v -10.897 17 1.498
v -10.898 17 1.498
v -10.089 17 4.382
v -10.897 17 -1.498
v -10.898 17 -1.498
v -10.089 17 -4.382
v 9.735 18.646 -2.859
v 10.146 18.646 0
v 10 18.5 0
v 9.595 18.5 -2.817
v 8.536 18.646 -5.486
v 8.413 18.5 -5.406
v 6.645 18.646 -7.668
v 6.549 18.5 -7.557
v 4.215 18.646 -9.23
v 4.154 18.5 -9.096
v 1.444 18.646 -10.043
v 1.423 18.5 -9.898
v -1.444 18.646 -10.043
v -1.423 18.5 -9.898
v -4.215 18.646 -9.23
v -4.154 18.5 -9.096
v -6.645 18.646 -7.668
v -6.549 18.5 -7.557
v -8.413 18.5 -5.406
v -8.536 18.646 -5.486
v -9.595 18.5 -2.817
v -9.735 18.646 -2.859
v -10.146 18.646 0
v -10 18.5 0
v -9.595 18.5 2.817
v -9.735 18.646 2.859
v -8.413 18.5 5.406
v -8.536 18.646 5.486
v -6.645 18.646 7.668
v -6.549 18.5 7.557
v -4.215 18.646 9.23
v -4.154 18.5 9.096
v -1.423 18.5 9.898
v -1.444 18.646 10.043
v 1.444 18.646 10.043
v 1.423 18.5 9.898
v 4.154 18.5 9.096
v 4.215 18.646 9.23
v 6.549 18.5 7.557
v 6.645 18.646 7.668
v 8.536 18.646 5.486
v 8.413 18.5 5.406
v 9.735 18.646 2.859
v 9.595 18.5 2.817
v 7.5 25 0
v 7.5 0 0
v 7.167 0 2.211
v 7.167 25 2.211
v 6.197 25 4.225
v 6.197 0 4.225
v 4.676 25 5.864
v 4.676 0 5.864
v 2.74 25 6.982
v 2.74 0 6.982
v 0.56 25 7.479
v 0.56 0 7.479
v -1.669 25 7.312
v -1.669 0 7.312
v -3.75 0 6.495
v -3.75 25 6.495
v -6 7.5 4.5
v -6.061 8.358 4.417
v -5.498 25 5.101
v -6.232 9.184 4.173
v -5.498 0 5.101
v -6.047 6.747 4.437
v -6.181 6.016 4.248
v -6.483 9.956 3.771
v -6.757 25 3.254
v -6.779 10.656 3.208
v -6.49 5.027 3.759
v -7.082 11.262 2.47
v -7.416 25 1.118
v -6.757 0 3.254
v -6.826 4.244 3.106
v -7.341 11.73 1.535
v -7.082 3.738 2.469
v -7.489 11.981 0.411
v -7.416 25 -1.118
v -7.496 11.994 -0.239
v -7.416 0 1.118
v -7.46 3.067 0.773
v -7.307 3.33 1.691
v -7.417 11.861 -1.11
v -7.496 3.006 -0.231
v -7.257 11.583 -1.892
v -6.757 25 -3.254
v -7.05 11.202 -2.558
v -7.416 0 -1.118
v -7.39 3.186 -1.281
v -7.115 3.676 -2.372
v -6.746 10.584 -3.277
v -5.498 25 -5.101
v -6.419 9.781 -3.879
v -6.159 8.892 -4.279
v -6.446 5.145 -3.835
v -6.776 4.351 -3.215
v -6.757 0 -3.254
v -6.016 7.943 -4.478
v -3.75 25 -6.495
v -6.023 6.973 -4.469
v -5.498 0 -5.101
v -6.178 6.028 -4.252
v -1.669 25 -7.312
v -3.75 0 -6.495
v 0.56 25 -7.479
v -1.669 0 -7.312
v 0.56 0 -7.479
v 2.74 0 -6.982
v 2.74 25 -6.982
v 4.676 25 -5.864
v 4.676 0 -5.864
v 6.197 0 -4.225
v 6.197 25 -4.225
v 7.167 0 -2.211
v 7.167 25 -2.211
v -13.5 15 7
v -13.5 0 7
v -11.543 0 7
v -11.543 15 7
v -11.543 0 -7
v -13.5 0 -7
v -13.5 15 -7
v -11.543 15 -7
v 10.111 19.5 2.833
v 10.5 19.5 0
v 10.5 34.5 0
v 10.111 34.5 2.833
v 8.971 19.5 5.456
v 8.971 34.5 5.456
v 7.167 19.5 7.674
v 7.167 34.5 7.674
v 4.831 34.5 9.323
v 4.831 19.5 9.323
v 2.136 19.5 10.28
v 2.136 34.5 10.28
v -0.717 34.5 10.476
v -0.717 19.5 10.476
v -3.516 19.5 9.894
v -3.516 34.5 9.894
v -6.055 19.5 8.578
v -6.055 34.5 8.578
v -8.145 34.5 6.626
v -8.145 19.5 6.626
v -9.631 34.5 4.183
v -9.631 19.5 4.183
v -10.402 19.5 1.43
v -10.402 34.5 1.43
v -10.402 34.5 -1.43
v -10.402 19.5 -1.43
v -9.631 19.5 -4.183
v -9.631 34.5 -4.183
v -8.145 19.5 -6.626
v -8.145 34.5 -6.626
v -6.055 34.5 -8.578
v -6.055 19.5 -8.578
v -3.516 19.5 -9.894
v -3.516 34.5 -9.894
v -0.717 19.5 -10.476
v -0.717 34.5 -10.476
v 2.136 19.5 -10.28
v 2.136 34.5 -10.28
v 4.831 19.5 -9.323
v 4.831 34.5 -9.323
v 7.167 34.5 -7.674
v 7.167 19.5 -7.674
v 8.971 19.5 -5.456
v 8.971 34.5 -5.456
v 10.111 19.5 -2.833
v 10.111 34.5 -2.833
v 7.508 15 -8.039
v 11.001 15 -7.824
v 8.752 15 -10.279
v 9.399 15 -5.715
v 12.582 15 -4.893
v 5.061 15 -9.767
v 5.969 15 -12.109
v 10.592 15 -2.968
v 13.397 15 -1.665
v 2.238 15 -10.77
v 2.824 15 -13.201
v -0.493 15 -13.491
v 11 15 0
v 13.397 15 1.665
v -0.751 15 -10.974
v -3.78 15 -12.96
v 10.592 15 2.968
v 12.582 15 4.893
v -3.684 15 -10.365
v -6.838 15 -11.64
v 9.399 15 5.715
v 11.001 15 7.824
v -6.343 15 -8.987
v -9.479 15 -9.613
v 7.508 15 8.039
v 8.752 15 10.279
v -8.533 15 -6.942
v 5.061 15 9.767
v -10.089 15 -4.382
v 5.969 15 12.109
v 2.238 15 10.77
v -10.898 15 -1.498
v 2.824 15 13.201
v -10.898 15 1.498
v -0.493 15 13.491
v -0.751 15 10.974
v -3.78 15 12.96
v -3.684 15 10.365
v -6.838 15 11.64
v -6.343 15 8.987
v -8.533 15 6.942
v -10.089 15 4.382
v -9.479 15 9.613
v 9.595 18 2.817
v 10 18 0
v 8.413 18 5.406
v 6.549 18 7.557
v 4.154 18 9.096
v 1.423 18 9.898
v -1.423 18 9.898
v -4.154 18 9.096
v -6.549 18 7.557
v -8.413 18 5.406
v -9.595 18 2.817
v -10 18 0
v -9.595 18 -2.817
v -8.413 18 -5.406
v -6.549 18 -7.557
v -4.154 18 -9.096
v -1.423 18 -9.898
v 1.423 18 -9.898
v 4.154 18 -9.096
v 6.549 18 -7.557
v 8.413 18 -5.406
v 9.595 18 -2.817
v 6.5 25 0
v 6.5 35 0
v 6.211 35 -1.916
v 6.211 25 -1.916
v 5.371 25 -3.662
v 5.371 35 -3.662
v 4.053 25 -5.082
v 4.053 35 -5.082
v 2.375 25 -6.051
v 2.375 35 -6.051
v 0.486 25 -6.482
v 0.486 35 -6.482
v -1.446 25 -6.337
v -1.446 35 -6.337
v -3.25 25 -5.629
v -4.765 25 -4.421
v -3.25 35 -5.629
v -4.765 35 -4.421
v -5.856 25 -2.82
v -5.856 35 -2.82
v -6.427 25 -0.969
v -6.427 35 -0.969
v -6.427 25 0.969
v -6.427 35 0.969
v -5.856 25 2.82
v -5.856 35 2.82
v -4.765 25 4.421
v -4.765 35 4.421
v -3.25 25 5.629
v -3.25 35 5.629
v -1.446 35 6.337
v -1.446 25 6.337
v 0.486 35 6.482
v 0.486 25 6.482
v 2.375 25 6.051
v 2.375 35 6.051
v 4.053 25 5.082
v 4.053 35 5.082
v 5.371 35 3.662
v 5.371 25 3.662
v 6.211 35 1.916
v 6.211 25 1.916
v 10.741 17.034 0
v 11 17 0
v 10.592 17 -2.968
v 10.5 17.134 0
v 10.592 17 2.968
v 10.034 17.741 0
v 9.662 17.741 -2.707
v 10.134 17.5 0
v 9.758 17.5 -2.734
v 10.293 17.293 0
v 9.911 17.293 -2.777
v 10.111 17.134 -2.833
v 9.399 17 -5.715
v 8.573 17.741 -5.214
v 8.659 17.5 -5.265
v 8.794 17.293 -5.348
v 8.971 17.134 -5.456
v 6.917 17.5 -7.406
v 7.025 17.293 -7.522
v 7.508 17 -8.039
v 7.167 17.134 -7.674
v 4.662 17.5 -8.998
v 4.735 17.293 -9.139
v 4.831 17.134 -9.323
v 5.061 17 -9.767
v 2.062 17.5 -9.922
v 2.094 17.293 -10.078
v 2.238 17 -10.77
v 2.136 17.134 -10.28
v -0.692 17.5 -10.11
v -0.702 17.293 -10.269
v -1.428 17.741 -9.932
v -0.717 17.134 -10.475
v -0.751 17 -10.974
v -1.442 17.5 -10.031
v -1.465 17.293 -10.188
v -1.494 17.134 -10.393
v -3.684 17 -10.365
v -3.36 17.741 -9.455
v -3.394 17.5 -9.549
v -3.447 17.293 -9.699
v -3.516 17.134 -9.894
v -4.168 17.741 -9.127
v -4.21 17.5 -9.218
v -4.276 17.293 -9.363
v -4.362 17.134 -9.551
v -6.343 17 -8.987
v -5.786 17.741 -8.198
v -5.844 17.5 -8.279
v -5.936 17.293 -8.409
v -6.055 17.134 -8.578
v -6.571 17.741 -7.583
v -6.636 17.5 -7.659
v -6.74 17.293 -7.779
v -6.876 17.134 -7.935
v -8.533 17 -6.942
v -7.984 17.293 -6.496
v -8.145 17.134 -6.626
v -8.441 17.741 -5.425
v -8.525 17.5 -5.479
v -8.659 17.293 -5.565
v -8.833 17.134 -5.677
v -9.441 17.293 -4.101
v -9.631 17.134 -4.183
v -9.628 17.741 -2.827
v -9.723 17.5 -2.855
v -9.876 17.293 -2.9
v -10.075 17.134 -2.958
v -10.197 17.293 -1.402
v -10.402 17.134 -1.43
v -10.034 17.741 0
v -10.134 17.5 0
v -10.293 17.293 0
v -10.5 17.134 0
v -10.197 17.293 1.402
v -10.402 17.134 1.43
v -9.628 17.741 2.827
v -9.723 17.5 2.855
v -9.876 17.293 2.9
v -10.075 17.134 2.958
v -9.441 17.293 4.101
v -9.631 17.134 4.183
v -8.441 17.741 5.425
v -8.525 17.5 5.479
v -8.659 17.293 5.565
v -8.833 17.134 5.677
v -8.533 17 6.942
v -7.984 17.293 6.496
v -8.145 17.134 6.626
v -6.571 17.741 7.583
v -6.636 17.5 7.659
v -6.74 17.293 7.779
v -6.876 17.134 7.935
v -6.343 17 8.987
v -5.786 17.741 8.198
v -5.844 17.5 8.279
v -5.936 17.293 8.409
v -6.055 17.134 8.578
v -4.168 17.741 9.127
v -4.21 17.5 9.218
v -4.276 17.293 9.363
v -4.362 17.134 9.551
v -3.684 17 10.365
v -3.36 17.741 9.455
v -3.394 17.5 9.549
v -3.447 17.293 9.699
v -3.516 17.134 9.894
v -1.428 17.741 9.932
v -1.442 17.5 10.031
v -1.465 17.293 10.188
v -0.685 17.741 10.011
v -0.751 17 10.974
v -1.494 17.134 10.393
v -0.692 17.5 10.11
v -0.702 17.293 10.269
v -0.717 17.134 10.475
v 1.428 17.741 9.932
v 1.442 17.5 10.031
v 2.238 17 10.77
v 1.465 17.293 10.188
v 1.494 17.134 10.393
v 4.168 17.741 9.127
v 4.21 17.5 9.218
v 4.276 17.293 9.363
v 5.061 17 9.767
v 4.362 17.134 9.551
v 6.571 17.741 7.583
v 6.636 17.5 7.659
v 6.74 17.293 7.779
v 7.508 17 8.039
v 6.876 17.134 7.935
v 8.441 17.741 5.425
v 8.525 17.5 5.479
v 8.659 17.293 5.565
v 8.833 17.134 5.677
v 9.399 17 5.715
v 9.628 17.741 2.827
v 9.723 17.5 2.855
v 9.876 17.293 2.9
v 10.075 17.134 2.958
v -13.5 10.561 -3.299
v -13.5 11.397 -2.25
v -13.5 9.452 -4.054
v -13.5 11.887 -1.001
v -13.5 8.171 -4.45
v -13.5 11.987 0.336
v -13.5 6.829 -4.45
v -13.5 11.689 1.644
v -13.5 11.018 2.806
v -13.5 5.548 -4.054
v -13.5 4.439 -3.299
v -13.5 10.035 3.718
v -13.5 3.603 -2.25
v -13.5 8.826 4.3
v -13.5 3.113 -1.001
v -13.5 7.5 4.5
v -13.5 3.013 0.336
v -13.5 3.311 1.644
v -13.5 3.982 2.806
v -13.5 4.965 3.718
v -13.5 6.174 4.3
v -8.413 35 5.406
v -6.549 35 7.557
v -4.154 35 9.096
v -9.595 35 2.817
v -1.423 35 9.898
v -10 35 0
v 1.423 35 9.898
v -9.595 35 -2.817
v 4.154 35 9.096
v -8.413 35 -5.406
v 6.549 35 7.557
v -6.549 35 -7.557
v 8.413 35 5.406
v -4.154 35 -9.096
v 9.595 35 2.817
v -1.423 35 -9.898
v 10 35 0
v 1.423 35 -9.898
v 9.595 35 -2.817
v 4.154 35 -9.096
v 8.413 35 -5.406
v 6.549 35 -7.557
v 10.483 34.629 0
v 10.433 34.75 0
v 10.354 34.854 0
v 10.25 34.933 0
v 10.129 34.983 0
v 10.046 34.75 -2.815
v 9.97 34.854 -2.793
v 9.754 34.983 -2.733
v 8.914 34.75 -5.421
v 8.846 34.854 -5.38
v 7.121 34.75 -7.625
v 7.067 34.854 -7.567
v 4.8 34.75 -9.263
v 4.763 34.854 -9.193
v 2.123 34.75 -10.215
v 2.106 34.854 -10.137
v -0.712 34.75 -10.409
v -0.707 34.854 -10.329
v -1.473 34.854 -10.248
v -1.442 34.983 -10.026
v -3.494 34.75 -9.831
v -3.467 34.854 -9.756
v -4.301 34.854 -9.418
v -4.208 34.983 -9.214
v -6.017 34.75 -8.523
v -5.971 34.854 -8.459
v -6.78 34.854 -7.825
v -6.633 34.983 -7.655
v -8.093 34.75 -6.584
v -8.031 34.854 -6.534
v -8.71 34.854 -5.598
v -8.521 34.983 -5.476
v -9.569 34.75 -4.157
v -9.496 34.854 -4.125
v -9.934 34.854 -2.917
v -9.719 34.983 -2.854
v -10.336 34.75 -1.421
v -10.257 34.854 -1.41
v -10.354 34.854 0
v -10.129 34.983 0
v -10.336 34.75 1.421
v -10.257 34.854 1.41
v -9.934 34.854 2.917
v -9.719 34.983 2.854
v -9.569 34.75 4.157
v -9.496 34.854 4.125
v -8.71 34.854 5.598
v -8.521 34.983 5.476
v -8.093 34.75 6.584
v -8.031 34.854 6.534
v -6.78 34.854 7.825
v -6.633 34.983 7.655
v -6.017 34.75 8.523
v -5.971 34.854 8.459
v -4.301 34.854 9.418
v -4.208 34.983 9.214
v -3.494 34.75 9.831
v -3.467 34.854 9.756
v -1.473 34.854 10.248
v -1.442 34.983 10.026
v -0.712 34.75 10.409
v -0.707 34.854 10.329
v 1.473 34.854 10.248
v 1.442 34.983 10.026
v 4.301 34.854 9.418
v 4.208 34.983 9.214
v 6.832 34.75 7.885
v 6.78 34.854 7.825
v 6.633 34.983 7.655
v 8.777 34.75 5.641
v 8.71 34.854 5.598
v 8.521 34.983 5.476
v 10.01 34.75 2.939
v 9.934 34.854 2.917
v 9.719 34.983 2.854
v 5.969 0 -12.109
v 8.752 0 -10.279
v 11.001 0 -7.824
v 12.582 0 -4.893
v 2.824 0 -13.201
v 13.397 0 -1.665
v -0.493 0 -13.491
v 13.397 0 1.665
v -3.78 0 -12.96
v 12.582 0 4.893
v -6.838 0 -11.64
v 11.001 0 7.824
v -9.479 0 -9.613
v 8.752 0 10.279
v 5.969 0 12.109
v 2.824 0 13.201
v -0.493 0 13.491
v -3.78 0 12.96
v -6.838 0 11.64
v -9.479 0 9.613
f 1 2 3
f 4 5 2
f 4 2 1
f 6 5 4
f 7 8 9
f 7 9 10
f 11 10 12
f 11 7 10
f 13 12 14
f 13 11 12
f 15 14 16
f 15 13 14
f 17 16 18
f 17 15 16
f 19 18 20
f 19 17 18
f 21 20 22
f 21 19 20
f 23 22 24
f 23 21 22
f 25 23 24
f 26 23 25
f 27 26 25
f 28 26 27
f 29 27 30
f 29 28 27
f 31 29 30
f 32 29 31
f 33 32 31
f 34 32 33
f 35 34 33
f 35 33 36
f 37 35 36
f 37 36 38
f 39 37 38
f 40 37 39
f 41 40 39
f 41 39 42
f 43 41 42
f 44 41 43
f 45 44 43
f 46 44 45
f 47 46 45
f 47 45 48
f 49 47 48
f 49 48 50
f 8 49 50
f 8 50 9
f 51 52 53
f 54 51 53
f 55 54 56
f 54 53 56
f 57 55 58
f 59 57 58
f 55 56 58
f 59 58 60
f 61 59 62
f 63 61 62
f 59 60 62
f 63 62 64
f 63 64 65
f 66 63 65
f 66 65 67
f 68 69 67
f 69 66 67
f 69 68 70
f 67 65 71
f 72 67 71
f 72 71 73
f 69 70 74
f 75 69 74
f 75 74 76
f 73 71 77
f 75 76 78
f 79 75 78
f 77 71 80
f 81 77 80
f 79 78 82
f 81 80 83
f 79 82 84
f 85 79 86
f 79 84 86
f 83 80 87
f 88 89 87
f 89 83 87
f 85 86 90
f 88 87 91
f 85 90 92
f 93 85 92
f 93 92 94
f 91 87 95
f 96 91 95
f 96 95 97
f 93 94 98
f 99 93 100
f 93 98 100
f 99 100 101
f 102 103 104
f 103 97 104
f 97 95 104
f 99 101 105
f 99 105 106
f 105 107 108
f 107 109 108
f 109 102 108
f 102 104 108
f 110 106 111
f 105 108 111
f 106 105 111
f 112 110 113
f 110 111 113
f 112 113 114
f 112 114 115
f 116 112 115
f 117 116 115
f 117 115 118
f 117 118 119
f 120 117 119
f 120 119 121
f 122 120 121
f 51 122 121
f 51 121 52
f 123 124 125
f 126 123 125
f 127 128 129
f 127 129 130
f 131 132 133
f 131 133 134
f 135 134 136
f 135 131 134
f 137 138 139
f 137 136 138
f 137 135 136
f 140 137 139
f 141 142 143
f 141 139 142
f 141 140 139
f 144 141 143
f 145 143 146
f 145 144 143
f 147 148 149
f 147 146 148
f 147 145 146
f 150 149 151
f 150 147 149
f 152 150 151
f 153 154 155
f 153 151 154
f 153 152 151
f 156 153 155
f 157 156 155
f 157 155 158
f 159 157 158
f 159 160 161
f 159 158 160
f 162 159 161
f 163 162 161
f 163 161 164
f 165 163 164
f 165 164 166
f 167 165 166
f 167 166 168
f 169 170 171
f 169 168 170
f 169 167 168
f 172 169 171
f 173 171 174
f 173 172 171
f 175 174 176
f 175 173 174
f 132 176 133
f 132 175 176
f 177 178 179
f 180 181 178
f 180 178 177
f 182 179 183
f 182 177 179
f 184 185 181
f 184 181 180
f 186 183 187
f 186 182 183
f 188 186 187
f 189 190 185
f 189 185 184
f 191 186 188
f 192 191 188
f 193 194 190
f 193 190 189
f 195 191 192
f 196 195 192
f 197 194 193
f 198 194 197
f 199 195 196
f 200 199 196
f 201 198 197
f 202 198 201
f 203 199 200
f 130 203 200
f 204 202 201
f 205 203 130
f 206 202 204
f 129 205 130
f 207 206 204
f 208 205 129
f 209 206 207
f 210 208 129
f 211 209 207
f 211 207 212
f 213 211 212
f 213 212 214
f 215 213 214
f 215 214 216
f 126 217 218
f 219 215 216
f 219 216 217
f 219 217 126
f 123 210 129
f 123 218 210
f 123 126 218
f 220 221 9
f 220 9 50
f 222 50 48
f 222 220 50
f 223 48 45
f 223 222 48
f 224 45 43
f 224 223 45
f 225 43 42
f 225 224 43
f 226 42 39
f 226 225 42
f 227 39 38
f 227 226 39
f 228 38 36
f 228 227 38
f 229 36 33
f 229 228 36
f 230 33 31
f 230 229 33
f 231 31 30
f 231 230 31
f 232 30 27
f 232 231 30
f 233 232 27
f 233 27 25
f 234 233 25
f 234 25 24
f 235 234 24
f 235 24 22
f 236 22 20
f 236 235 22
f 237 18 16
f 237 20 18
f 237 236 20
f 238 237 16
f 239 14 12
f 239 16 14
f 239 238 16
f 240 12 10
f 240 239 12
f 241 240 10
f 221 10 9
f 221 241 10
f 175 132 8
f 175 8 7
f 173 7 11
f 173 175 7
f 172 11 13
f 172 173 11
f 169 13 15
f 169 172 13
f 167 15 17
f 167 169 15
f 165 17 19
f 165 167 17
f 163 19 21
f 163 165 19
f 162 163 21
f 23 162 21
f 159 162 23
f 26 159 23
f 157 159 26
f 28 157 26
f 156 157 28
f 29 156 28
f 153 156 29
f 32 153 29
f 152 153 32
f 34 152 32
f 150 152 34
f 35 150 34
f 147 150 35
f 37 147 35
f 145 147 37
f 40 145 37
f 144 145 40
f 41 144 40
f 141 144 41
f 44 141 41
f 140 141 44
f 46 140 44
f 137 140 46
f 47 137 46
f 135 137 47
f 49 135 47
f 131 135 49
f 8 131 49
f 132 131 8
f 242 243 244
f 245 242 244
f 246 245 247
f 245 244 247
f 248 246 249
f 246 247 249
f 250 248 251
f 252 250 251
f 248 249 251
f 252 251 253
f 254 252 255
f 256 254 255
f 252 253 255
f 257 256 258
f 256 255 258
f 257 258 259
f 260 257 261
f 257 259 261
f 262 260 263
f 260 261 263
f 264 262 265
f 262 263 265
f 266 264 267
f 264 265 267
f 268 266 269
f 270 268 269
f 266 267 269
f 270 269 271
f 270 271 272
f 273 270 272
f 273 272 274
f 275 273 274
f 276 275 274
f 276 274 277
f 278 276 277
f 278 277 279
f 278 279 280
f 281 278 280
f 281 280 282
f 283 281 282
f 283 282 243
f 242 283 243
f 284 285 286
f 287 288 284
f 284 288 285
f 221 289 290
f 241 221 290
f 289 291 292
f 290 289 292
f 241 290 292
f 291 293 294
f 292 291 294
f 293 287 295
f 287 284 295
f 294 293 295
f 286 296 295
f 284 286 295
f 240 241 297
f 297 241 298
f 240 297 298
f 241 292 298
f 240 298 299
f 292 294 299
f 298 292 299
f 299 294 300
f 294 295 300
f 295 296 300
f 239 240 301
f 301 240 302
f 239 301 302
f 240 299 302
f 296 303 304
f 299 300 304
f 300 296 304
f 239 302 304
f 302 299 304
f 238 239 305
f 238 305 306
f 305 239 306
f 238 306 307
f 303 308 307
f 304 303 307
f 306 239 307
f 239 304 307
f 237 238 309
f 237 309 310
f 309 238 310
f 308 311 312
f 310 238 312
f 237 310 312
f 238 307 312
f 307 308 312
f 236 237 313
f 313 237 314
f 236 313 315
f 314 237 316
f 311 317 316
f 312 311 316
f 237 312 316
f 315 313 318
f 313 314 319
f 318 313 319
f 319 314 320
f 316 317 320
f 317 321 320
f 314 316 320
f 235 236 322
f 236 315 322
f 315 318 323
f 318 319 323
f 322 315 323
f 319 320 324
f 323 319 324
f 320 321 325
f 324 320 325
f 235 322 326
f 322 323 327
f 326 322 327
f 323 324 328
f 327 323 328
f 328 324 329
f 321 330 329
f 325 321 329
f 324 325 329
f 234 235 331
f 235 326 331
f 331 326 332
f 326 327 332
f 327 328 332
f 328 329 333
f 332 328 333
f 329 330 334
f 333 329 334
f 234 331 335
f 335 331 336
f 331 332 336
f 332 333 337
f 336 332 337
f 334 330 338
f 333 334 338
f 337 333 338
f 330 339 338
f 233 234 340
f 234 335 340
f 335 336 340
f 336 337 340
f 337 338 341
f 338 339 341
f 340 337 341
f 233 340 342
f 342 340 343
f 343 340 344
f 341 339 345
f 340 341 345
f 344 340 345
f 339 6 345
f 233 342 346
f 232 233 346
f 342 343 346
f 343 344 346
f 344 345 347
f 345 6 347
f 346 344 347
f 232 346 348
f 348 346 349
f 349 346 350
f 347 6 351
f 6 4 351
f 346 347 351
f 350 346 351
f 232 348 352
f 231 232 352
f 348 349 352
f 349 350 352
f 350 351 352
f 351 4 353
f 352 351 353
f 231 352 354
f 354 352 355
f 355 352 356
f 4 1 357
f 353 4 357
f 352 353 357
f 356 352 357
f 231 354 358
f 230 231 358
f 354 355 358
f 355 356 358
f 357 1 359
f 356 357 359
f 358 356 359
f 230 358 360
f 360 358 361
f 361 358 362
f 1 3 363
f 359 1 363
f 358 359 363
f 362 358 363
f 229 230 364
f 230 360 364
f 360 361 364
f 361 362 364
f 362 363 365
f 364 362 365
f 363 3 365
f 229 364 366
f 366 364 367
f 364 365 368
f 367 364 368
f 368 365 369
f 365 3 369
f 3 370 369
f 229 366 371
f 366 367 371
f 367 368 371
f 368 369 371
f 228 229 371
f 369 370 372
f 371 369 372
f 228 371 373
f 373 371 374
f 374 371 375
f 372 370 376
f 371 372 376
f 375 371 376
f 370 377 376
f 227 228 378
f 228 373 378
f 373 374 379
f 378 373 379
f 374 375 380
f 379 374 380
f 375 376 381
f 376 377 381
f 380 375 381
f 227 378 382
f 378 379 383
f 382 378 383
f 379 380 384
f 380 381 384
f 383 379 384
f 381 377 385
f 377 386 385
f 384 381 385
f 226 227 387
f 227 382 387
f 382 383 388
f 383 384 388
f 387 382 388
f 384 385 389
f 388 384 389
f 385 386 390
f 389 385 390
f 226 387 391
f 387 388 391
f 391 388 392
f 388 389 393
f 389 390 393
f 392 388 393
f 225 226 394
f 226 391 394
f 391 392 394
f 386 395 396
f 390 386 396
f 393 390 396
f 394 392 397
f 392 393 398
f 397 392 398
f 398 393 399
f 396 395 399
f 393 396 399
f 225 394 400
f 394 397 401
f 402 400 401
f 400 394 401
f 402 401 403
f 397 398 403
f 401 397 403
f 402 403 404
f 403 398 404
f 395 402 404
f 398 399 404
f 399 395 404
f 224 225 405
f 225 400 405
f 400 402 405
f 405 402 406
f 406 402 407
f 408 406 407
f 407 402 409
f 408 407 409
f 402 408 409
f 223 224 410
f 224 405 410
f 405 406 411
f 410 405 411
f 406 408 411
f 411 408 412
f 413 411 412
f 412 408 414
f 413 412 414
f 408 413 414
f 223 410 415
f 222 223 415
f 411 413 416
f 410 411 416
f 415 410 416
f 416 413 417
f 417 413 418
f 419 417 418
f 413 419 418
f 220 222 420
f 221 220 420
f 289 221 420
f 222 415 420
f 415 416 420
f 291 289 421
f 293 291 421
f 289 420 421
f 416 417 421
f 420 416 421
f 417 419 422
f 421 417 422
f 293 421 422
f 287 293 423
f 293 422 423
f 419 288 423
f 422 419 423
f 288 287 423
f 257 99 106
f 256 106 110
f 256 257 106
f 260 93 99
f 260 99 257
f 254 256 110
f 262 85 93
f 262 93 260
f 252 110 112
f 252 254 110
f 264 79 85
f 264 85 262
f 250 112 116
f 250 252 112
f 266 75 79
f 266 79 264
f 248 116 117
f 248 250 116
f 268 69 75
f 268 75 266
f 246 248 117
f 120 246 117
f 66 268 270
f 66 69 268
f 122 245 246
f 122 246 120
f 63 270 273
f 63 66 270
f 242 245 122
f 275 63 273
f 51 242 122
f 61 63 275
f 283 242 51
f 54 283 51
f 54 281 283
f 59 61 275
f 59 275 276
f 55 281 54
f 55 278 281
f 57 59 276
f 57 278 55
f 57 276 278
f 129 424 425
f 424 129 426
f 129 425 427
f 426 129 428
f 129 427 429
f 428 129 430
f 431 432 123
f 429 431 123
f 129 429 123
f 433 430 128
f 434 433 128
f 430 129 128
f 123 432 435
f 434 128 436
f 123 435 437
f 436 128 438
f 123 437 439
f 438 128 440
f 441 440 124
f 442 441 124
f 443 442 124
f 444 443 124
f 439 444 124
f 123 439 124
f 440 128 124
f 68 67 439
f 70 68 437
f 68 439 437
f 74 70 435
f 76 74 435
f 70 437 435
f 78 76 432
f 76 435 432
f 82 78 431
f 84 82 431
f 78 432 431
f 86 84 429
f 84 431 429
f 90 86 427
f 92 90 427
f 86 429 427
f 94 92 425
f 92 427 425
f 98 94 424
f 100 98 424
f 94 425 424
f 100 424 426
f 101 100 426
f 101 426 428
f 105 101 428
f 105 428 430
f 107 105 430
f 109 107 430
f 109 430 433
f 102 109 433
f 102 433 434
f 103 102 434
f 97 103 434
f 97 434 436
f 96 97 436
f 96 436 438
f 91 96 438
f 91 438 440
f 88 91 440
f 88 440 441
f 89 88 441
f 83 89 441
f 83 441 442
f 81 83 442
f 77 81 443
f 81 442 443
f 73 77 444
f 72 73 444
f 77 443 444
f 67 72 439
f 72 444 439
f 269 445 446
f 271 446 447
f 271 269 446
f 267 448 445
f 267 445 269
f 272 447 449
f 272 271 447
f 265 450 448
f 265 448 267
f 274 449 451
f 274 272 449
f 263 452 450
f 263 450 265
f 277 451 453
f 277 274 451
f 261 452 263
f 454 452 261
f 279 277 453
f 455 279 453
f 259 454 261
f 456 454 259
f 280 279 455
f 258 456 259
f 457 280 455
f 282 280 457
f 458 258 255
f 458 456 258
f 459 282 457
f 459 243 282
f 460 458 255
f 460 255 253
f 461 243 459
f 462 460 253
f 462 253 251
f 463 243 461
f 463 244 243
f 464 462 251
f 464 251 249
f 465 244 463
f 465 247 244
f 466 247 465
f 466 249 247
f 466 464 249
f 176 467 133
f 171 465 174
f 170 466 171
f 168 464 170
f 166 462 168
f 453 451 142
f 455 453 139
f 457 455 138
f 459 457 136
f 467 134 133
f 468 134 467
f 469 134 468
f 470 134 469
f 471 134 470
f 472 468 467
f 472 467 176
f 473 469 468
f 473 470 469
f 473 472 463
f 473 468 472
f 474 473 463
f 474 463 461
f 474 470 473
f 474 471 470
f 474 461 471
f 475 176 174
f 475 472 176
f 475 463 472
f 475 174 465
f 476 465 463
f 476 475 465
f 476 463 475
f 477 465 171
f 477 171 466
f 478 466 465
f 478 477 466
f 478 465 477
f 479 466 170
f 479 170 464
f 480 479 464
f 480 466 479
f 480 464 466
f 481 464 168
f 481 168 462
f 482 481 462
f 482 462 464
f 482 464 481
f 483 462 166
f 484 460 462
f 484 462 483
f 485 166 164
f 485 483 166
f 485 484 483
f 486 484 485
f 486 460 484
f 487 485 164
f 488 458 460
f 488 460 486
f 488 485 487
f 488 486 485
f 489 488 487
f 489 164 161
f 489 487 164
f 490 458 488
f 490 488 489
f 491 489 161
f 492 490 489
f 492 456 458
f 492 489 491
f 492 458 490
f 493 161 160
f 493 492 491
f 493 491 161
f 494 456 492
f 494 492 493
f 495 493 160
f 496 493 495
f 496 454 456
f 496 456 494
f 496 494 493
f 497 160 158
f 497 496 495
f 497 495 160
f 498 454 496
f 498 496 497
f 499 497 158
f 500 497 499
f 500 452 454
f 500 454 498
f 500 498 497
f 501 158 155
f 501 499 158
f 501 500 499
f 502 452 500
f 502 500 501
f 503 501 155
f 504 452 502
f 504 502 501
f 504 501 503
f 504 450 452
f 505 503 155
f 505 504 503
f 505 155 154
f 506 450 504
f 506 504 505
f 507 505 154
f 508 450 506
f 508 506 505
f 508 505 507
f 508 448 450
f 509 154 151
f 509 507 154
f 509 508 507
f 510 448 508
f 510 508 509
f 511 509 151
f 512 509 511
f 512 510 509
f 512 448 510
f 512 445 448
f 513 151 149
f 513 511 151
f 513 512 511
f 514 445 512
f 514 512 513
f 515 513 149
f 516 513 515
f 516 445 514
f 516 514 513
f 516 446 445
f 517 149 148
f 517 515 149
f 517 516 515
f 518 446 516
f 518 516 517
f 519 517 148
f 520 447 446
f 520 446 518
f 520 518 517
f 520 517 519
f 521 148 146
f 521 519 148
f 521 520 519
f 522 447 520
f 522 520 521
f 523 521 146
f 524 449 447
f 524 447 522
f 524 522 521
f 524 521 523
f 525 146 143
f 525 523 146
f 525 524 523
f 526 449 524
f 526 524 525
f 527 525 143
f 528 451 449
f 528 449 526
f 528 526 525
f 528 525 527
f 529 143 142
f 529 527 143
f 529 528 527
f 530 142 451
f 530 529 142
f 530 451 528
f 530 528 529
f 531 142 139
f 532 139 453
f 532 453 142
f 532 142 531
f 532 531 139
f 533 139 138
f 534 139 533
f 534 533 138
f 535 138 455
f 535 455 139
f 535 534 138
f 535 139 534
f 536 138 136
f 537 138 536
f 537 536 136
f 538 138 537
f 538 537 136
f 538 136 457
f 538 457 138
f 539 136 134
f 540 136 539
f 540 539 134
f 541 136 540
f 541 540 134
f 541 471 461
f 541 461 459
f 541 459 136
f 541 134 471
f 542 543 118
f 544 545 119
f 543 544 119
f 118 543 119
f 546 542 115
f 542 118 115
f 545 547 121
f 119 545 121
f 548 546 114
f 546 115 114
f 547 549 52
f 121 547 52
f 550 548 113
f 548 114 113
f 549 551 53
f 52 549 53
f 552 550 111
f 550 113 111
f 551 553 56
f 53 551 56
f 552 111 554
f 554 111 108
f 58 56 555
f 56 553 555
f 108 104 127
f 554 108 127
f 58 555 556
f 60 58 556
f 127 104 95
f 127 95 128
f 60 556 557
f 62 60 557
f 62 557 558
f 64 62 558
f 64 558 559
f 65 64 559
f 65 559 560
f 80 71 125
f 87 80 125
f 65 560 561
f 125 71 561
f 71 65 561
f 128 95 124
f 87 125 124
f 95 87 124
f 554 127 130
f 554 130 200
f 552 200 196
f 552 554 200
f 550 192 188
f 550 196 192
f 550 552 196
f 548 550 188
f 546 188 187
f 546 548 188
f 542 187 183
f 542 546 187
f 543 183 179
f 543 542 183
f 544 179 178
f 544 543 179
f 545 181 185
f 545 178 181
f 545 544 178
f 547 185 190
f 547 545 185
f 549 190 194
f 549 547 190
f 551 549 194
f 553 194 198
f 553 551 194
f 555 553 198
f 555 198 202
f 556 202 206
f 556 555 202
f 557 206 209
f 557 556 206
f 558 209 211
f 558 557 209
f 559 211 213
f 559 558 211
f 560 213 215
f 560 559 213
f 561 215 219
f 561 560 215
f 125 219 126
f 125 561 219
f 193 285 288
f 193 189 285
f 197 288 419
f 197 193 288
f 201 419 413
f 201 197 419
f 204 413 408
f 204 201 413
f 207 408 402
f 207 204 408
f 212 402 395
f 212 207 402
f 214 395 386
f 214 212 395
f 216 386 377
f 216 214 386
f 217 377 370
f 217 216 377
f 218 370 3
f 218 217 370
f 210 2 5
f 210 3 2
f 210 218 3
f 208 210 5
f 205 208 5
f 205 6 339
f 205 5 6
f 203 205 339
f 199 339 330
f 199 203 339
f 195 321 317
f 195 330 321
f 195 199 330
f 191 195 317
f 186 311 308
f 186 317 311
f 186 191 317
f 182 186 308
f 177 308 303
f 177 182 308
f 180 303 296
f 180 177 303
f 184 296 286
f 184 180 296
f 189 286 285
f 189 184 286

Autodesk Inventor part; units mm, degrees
ref_plane "YZ Plane" through (0, 0, 0) normal (1, 0, 0) x (0, 1, 0)
ref_plane "XZ Plane" through (0, 0, 0) normal (0, 1, 0) x (-1, 0, 0)
ref_plane "XY Plane" through (0, 0, 0) normal (0, 0, 1) x (1, 0, 0)
sketch "Sketch1" plane through (0, 0, 0) normal (0, 1, 0) x (-1, 0, 0)
  arc A0 (11.5434, 7) -> (11.5434, -7) centre (0, 0) ccw
  line L0 (13.5, 0) -> (20.5, 0) construction
  line L1 (13.5, -7) -> (13.5, 7)
  line L2 (13.5, 7) -> (11.5434, 7)
  line L3 (13.5, -7) -> (11.5434, -7)
  dimension "d0" = 27
  dimension "d1" = 7
  dimension "d3" = 14
extrude "Extrusion1" add sketch "Sketch1" along normal blind 15
sketch "Sketch2" plane through (0, 15, 0) normal (0, 1, 0) x (1, 0, 0)
  circle A0 centre (0, 0) radius 11
  dimension "d6" = 22
extrude "Extrusion2" add sketch "Sketch2" along normal blind 2
sketch "Sketch3" plane through (0, 17, 0) normal (0, 1, 0) x (1, 0, 0)
  circle A0 centre (0, 0) radius 10
  dimension "d9" = 20
extrude "Extrusion3" add sketch "Sketch3" along normal blind 2
sketch "Sketch4" plane through (0, 19, 0) normal (0, 1, 0) x (1, 0, 0)
  circle A0 centre (0, 0) radius 10.5
  dimension "d12" = 21
extrude "Extrusion4" add sketch "Sketch4" along normal blind 16
fillet "Fillet1" radius 1 1 edges at (-10, 17, 0)
chamfer "Chamfer1" distance 0.5 angle 45 2 edges at (-10, 19, 0) (-10.5, 19, 0)
fillet "Fillet2" radius 0.5 1 edges at (-10.5, 35, 0)
thread "Thread1" size "M10x1" class "6g" standard "ISO Metric profile" full length
sketch "Sketch5" plane through (-13.5, 0, -7) normal (-1, 0, 0) x (0, 0, 1)
  point P0 (7, 0)
sketch "Sketch6" plane through (0, 0, 0) normal (0, -1, 0) x (1, 0, 0)
  circle A0 centre (0, 0) radius 7.5
  dimension "d22" = 15
extrude "Extrusion5" cut sketch "Sketch6" against normal blind 25
sketch "Sketch7" plane through (-13.5, 0, -7) normal (-1, 0, 0) x (0, 0, 1)
  circle A0 centre (7, 7.5) radius 4.5
  point P0 (7, 0)
  dimension "d25" = 9
extrude "Extrusion6" cut sketch "Sketch7" against normal blind 18
thread "Thread2" size "M8x0.8" class "6H" standard "ISO Metric profile" full length
sketch "Sketch8" plane through (0, 35, 0) normal (0, 1, 0) x (1, 0, 0)
  circle A0 centre (0, 0) radius 6.5
  dimension "d30" = 13
extrude "Extrusion7" cut sketch "Sketch8" against normal blind 18
sketch "Sketch9" plane through (0, 35, 0) normal (0, 1, 0) x (1, 0, 0)
  point P0 (0, 0)
properties part number "prednji deo" material "ABS Plastic"
